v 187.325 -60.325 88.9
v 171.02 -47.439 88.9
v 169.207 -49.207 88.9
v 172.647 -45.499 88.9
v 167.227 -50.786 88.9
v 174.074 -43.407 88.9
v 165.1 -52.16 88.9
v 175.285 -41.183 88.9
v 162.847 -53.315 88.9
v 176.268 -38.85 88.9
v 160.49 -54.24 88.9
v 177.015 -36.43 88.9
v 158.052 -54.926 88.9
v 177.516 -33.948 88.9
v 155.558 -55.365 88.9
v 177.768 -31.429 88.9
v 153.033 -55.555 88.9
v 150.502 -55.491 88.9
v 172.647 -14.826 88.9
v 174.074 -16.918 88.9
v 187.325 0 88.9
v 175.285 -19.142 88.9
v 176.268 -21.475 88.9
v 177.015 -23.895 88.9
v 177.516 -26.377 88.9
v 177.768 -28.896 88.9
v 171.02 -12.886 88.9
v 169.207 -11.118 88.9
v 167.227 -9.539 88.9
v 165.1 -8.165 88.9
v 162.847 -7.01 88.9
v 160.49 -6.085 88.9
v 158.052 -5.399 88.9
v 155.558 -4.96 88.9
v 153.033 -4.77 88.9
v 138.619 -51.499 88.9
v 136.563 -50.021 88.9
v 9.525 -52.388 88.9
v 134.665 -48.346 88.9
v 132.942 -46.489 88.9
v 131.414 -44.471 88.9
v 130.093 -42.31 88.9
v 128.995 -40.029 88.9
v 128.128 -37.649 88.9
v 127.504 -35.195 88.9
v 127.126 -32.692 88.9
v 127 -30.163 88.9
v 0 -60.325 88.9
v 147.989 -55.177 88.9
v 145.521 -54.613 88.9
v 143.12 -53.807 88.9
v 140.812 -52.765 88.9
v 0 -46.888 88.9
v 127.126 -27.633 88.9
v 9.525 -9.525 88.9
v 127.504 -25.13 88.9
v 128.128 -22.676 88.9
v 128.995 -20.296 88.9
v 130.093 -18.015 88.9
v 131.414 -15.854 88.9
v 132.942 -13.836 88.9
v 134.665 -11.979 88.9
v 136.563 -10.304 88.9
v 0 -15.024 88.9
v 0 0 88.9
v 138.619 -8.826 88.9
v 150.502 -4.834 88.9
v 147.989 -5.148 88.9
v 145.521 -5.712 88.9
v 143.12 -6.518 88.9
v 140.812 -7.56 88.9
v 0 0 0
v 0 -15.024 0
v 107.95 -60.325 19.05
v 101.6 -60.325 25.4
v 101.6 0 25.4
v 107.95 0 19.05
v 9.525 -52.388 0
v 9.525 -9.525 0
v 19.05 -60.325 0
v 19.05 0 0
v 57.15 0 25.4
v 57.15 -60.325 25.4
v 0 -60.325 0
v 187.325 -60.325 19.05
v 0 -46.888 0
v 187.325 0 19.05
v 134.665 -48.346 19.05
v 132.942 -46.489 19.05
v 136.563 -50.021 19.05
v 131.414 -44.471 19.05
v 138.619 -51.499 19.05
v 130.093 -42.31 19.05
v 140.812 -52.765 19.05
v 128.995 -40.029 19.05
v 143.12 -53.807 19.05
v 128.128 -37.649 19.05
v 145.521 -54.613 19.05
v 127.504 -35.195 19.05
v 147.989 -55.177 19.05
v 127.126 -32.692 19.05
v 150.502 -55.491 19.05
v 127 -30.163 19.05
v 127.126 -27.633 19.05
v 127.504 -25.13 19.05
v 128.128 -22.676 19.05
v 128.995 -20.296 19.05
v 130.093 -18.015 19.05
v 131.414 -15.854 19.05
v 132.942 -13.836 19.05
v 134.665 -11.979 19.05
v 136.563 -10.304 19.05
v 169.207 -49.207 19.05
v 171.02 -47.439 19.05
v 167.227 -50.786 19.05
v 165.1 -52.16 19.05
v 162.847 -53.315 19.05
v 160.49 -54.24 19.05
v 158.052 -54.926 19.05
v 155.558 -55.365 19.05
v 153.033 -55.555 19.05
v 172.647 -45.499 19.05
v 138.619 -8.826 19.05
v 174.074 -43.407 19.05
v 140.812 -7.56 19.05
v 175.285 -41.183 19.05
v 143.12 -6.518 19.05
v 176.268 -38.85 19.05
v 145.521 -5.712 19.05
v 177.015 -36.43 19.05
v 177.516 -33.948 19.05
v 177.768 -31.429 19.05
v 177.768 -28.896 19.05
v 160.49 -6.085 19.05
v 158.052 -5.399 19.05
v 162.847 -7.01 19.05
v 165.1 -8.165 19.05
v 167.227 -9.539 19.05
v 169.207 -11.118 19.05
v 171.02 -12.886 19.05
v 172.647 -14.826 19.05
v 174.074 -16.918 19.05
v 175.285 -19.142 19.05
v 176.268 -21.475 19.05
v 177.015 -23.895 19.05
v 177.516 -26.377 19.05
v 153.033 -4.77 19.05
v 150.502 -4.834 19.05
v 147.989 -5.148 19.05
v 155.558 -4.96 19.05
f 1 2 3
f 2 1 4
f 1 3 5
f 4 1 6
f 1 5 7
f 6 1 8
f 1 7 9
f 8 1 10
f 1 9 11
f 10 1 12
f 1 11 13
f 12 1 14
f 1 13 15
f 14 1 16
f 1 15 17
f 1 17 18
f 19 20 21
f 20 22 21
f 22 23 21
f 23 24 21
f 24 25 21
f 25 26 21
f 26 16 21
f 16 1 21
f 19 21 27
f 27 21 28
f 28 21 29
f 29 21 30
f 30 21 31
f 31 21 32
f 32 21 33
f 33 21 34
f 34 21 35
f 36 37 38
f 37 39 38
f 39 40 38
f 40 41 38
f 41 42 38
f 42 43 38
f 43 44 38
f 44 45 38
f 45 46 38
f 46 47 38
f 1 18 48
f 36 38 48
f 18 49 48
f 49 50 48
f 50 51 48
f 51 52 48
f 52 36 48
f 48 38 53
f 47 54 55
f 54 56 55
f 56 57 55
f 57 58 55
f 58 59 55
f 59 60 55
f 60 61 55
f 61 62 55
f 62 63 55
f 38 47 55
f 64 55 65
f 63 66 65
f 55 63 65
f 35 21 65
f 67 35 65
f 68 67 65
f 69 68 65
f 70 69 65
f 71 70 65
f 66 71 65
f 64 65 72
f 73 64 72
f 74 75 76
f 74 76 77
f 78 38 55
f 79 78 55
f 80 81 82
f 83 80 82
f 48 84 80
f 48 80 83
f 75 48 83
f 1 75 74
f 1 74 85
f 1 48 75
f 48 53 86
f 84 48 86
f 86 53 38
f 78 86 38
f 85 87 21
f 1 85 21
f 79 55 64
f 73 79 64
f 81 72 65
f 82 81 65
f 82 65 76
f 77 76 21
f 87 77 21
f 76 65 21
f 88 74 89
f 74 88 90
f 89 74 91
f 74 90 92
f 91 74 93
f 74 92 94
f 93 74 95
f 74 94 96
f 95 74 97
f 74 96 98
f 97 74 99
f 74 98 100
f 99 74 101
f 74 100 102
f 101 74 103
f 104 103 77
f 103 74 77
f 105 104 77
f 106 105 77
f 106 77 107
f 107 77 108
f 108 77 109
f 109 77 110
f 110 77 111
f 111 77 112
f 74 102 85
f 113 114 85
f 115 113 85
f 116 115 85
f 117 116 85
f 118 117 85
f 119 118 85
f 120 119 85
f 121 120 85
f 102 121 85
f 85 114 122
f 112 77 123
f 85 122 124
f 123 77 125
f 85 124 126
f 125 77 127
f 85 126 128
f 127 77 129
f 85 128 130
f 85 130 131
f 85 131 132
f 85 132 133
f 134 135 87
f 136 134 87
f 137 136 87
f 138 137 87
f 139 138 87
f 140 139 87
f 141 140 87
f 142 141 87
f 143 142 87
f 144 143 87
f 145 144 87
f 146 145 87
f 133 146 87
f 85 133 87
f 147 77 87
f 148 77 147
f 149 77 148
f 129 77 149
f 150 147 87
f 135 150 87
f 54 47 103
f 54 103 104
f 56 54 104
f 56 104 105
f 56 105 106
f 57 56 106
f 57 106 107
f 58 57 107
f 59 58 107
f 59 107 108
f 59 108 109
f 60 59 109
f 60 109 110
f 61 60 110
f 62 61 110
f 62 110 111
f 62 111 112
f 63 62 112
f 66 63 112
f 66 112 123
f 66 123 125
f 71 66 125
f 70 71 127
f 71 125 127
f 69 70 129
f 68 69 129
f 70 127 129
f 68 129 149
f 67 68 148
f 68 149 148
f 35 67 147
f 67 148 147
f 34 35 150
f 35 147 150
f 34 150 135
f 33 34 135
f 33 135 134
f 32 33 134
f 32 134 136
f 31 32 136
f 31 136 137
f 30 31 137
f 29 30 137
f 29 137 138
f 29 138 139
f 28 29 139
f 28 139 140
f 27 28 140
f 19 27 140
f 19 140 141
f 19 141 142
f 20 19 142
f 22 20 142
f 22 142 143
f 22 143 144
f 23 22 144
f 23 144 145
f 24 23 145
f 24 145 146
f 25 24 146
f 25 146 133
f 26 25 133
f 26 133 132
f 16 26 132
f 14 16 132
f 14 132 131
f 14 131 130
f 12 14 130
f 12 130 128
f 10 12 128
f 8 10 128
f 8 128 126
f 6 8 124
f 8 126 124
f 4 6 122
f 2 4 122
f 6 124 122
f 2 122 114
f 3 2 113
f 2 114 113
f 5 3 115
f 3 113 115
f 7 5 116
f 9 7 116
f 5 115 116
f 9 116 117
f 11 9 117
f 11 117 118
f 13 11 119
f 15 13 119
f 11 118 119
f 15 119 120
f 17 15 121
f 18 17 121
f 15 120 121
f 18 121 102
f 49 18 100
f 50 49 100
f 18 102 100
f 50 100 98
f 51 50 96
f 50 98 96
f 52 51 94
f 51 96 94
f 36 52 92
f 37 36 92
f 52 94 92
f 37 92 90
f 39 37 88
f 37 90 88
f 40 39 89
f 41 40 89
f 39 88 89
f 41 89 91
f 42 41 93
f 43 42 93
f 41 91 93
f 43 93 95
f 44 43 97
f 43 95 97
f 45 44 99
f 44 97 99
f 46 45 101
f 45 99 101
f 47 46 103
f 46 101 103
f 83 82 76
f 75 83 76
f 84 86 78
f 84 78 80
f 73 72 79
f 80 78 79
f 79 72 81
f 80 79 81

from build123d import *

# Parameters (mm, degrees)
F1_DEPTH = 60.325
F3_D     = 50.8
F5_DEPTH = 88.901


with BuildPart() as f1:
    # F0 (on Front) → F1 (new body)
    with BuildSketch(Plane.XZ):
        Polygon((0, 88.9), (0, 0), (19.05, 0), (57.15, 25.4), (101.6, 25.4), (107.95, 19.05), (187.325, 19.05), (187.325, 88.9), align=None)
    extrude(amount=F1_DEPTH)

    # F3 (through all)
    with Locations(Plane.XY.offset(88.9)):
        with Locations((152.4, -30.1625)):
            Hole(F3_D / 2)

    # F4 (on face) → F5 (cut, through all)
    with BuildSketch(Plane.XY.offset(88.9)):
        Polygon((9.525, -9.525), (0, -15.024261), (0, -46.888239), (9.525, -52.3875), align=None)
    extrude(amount=-F5_DEPTH, mode=Mode.SUBTRACT)


solid = f1.part
